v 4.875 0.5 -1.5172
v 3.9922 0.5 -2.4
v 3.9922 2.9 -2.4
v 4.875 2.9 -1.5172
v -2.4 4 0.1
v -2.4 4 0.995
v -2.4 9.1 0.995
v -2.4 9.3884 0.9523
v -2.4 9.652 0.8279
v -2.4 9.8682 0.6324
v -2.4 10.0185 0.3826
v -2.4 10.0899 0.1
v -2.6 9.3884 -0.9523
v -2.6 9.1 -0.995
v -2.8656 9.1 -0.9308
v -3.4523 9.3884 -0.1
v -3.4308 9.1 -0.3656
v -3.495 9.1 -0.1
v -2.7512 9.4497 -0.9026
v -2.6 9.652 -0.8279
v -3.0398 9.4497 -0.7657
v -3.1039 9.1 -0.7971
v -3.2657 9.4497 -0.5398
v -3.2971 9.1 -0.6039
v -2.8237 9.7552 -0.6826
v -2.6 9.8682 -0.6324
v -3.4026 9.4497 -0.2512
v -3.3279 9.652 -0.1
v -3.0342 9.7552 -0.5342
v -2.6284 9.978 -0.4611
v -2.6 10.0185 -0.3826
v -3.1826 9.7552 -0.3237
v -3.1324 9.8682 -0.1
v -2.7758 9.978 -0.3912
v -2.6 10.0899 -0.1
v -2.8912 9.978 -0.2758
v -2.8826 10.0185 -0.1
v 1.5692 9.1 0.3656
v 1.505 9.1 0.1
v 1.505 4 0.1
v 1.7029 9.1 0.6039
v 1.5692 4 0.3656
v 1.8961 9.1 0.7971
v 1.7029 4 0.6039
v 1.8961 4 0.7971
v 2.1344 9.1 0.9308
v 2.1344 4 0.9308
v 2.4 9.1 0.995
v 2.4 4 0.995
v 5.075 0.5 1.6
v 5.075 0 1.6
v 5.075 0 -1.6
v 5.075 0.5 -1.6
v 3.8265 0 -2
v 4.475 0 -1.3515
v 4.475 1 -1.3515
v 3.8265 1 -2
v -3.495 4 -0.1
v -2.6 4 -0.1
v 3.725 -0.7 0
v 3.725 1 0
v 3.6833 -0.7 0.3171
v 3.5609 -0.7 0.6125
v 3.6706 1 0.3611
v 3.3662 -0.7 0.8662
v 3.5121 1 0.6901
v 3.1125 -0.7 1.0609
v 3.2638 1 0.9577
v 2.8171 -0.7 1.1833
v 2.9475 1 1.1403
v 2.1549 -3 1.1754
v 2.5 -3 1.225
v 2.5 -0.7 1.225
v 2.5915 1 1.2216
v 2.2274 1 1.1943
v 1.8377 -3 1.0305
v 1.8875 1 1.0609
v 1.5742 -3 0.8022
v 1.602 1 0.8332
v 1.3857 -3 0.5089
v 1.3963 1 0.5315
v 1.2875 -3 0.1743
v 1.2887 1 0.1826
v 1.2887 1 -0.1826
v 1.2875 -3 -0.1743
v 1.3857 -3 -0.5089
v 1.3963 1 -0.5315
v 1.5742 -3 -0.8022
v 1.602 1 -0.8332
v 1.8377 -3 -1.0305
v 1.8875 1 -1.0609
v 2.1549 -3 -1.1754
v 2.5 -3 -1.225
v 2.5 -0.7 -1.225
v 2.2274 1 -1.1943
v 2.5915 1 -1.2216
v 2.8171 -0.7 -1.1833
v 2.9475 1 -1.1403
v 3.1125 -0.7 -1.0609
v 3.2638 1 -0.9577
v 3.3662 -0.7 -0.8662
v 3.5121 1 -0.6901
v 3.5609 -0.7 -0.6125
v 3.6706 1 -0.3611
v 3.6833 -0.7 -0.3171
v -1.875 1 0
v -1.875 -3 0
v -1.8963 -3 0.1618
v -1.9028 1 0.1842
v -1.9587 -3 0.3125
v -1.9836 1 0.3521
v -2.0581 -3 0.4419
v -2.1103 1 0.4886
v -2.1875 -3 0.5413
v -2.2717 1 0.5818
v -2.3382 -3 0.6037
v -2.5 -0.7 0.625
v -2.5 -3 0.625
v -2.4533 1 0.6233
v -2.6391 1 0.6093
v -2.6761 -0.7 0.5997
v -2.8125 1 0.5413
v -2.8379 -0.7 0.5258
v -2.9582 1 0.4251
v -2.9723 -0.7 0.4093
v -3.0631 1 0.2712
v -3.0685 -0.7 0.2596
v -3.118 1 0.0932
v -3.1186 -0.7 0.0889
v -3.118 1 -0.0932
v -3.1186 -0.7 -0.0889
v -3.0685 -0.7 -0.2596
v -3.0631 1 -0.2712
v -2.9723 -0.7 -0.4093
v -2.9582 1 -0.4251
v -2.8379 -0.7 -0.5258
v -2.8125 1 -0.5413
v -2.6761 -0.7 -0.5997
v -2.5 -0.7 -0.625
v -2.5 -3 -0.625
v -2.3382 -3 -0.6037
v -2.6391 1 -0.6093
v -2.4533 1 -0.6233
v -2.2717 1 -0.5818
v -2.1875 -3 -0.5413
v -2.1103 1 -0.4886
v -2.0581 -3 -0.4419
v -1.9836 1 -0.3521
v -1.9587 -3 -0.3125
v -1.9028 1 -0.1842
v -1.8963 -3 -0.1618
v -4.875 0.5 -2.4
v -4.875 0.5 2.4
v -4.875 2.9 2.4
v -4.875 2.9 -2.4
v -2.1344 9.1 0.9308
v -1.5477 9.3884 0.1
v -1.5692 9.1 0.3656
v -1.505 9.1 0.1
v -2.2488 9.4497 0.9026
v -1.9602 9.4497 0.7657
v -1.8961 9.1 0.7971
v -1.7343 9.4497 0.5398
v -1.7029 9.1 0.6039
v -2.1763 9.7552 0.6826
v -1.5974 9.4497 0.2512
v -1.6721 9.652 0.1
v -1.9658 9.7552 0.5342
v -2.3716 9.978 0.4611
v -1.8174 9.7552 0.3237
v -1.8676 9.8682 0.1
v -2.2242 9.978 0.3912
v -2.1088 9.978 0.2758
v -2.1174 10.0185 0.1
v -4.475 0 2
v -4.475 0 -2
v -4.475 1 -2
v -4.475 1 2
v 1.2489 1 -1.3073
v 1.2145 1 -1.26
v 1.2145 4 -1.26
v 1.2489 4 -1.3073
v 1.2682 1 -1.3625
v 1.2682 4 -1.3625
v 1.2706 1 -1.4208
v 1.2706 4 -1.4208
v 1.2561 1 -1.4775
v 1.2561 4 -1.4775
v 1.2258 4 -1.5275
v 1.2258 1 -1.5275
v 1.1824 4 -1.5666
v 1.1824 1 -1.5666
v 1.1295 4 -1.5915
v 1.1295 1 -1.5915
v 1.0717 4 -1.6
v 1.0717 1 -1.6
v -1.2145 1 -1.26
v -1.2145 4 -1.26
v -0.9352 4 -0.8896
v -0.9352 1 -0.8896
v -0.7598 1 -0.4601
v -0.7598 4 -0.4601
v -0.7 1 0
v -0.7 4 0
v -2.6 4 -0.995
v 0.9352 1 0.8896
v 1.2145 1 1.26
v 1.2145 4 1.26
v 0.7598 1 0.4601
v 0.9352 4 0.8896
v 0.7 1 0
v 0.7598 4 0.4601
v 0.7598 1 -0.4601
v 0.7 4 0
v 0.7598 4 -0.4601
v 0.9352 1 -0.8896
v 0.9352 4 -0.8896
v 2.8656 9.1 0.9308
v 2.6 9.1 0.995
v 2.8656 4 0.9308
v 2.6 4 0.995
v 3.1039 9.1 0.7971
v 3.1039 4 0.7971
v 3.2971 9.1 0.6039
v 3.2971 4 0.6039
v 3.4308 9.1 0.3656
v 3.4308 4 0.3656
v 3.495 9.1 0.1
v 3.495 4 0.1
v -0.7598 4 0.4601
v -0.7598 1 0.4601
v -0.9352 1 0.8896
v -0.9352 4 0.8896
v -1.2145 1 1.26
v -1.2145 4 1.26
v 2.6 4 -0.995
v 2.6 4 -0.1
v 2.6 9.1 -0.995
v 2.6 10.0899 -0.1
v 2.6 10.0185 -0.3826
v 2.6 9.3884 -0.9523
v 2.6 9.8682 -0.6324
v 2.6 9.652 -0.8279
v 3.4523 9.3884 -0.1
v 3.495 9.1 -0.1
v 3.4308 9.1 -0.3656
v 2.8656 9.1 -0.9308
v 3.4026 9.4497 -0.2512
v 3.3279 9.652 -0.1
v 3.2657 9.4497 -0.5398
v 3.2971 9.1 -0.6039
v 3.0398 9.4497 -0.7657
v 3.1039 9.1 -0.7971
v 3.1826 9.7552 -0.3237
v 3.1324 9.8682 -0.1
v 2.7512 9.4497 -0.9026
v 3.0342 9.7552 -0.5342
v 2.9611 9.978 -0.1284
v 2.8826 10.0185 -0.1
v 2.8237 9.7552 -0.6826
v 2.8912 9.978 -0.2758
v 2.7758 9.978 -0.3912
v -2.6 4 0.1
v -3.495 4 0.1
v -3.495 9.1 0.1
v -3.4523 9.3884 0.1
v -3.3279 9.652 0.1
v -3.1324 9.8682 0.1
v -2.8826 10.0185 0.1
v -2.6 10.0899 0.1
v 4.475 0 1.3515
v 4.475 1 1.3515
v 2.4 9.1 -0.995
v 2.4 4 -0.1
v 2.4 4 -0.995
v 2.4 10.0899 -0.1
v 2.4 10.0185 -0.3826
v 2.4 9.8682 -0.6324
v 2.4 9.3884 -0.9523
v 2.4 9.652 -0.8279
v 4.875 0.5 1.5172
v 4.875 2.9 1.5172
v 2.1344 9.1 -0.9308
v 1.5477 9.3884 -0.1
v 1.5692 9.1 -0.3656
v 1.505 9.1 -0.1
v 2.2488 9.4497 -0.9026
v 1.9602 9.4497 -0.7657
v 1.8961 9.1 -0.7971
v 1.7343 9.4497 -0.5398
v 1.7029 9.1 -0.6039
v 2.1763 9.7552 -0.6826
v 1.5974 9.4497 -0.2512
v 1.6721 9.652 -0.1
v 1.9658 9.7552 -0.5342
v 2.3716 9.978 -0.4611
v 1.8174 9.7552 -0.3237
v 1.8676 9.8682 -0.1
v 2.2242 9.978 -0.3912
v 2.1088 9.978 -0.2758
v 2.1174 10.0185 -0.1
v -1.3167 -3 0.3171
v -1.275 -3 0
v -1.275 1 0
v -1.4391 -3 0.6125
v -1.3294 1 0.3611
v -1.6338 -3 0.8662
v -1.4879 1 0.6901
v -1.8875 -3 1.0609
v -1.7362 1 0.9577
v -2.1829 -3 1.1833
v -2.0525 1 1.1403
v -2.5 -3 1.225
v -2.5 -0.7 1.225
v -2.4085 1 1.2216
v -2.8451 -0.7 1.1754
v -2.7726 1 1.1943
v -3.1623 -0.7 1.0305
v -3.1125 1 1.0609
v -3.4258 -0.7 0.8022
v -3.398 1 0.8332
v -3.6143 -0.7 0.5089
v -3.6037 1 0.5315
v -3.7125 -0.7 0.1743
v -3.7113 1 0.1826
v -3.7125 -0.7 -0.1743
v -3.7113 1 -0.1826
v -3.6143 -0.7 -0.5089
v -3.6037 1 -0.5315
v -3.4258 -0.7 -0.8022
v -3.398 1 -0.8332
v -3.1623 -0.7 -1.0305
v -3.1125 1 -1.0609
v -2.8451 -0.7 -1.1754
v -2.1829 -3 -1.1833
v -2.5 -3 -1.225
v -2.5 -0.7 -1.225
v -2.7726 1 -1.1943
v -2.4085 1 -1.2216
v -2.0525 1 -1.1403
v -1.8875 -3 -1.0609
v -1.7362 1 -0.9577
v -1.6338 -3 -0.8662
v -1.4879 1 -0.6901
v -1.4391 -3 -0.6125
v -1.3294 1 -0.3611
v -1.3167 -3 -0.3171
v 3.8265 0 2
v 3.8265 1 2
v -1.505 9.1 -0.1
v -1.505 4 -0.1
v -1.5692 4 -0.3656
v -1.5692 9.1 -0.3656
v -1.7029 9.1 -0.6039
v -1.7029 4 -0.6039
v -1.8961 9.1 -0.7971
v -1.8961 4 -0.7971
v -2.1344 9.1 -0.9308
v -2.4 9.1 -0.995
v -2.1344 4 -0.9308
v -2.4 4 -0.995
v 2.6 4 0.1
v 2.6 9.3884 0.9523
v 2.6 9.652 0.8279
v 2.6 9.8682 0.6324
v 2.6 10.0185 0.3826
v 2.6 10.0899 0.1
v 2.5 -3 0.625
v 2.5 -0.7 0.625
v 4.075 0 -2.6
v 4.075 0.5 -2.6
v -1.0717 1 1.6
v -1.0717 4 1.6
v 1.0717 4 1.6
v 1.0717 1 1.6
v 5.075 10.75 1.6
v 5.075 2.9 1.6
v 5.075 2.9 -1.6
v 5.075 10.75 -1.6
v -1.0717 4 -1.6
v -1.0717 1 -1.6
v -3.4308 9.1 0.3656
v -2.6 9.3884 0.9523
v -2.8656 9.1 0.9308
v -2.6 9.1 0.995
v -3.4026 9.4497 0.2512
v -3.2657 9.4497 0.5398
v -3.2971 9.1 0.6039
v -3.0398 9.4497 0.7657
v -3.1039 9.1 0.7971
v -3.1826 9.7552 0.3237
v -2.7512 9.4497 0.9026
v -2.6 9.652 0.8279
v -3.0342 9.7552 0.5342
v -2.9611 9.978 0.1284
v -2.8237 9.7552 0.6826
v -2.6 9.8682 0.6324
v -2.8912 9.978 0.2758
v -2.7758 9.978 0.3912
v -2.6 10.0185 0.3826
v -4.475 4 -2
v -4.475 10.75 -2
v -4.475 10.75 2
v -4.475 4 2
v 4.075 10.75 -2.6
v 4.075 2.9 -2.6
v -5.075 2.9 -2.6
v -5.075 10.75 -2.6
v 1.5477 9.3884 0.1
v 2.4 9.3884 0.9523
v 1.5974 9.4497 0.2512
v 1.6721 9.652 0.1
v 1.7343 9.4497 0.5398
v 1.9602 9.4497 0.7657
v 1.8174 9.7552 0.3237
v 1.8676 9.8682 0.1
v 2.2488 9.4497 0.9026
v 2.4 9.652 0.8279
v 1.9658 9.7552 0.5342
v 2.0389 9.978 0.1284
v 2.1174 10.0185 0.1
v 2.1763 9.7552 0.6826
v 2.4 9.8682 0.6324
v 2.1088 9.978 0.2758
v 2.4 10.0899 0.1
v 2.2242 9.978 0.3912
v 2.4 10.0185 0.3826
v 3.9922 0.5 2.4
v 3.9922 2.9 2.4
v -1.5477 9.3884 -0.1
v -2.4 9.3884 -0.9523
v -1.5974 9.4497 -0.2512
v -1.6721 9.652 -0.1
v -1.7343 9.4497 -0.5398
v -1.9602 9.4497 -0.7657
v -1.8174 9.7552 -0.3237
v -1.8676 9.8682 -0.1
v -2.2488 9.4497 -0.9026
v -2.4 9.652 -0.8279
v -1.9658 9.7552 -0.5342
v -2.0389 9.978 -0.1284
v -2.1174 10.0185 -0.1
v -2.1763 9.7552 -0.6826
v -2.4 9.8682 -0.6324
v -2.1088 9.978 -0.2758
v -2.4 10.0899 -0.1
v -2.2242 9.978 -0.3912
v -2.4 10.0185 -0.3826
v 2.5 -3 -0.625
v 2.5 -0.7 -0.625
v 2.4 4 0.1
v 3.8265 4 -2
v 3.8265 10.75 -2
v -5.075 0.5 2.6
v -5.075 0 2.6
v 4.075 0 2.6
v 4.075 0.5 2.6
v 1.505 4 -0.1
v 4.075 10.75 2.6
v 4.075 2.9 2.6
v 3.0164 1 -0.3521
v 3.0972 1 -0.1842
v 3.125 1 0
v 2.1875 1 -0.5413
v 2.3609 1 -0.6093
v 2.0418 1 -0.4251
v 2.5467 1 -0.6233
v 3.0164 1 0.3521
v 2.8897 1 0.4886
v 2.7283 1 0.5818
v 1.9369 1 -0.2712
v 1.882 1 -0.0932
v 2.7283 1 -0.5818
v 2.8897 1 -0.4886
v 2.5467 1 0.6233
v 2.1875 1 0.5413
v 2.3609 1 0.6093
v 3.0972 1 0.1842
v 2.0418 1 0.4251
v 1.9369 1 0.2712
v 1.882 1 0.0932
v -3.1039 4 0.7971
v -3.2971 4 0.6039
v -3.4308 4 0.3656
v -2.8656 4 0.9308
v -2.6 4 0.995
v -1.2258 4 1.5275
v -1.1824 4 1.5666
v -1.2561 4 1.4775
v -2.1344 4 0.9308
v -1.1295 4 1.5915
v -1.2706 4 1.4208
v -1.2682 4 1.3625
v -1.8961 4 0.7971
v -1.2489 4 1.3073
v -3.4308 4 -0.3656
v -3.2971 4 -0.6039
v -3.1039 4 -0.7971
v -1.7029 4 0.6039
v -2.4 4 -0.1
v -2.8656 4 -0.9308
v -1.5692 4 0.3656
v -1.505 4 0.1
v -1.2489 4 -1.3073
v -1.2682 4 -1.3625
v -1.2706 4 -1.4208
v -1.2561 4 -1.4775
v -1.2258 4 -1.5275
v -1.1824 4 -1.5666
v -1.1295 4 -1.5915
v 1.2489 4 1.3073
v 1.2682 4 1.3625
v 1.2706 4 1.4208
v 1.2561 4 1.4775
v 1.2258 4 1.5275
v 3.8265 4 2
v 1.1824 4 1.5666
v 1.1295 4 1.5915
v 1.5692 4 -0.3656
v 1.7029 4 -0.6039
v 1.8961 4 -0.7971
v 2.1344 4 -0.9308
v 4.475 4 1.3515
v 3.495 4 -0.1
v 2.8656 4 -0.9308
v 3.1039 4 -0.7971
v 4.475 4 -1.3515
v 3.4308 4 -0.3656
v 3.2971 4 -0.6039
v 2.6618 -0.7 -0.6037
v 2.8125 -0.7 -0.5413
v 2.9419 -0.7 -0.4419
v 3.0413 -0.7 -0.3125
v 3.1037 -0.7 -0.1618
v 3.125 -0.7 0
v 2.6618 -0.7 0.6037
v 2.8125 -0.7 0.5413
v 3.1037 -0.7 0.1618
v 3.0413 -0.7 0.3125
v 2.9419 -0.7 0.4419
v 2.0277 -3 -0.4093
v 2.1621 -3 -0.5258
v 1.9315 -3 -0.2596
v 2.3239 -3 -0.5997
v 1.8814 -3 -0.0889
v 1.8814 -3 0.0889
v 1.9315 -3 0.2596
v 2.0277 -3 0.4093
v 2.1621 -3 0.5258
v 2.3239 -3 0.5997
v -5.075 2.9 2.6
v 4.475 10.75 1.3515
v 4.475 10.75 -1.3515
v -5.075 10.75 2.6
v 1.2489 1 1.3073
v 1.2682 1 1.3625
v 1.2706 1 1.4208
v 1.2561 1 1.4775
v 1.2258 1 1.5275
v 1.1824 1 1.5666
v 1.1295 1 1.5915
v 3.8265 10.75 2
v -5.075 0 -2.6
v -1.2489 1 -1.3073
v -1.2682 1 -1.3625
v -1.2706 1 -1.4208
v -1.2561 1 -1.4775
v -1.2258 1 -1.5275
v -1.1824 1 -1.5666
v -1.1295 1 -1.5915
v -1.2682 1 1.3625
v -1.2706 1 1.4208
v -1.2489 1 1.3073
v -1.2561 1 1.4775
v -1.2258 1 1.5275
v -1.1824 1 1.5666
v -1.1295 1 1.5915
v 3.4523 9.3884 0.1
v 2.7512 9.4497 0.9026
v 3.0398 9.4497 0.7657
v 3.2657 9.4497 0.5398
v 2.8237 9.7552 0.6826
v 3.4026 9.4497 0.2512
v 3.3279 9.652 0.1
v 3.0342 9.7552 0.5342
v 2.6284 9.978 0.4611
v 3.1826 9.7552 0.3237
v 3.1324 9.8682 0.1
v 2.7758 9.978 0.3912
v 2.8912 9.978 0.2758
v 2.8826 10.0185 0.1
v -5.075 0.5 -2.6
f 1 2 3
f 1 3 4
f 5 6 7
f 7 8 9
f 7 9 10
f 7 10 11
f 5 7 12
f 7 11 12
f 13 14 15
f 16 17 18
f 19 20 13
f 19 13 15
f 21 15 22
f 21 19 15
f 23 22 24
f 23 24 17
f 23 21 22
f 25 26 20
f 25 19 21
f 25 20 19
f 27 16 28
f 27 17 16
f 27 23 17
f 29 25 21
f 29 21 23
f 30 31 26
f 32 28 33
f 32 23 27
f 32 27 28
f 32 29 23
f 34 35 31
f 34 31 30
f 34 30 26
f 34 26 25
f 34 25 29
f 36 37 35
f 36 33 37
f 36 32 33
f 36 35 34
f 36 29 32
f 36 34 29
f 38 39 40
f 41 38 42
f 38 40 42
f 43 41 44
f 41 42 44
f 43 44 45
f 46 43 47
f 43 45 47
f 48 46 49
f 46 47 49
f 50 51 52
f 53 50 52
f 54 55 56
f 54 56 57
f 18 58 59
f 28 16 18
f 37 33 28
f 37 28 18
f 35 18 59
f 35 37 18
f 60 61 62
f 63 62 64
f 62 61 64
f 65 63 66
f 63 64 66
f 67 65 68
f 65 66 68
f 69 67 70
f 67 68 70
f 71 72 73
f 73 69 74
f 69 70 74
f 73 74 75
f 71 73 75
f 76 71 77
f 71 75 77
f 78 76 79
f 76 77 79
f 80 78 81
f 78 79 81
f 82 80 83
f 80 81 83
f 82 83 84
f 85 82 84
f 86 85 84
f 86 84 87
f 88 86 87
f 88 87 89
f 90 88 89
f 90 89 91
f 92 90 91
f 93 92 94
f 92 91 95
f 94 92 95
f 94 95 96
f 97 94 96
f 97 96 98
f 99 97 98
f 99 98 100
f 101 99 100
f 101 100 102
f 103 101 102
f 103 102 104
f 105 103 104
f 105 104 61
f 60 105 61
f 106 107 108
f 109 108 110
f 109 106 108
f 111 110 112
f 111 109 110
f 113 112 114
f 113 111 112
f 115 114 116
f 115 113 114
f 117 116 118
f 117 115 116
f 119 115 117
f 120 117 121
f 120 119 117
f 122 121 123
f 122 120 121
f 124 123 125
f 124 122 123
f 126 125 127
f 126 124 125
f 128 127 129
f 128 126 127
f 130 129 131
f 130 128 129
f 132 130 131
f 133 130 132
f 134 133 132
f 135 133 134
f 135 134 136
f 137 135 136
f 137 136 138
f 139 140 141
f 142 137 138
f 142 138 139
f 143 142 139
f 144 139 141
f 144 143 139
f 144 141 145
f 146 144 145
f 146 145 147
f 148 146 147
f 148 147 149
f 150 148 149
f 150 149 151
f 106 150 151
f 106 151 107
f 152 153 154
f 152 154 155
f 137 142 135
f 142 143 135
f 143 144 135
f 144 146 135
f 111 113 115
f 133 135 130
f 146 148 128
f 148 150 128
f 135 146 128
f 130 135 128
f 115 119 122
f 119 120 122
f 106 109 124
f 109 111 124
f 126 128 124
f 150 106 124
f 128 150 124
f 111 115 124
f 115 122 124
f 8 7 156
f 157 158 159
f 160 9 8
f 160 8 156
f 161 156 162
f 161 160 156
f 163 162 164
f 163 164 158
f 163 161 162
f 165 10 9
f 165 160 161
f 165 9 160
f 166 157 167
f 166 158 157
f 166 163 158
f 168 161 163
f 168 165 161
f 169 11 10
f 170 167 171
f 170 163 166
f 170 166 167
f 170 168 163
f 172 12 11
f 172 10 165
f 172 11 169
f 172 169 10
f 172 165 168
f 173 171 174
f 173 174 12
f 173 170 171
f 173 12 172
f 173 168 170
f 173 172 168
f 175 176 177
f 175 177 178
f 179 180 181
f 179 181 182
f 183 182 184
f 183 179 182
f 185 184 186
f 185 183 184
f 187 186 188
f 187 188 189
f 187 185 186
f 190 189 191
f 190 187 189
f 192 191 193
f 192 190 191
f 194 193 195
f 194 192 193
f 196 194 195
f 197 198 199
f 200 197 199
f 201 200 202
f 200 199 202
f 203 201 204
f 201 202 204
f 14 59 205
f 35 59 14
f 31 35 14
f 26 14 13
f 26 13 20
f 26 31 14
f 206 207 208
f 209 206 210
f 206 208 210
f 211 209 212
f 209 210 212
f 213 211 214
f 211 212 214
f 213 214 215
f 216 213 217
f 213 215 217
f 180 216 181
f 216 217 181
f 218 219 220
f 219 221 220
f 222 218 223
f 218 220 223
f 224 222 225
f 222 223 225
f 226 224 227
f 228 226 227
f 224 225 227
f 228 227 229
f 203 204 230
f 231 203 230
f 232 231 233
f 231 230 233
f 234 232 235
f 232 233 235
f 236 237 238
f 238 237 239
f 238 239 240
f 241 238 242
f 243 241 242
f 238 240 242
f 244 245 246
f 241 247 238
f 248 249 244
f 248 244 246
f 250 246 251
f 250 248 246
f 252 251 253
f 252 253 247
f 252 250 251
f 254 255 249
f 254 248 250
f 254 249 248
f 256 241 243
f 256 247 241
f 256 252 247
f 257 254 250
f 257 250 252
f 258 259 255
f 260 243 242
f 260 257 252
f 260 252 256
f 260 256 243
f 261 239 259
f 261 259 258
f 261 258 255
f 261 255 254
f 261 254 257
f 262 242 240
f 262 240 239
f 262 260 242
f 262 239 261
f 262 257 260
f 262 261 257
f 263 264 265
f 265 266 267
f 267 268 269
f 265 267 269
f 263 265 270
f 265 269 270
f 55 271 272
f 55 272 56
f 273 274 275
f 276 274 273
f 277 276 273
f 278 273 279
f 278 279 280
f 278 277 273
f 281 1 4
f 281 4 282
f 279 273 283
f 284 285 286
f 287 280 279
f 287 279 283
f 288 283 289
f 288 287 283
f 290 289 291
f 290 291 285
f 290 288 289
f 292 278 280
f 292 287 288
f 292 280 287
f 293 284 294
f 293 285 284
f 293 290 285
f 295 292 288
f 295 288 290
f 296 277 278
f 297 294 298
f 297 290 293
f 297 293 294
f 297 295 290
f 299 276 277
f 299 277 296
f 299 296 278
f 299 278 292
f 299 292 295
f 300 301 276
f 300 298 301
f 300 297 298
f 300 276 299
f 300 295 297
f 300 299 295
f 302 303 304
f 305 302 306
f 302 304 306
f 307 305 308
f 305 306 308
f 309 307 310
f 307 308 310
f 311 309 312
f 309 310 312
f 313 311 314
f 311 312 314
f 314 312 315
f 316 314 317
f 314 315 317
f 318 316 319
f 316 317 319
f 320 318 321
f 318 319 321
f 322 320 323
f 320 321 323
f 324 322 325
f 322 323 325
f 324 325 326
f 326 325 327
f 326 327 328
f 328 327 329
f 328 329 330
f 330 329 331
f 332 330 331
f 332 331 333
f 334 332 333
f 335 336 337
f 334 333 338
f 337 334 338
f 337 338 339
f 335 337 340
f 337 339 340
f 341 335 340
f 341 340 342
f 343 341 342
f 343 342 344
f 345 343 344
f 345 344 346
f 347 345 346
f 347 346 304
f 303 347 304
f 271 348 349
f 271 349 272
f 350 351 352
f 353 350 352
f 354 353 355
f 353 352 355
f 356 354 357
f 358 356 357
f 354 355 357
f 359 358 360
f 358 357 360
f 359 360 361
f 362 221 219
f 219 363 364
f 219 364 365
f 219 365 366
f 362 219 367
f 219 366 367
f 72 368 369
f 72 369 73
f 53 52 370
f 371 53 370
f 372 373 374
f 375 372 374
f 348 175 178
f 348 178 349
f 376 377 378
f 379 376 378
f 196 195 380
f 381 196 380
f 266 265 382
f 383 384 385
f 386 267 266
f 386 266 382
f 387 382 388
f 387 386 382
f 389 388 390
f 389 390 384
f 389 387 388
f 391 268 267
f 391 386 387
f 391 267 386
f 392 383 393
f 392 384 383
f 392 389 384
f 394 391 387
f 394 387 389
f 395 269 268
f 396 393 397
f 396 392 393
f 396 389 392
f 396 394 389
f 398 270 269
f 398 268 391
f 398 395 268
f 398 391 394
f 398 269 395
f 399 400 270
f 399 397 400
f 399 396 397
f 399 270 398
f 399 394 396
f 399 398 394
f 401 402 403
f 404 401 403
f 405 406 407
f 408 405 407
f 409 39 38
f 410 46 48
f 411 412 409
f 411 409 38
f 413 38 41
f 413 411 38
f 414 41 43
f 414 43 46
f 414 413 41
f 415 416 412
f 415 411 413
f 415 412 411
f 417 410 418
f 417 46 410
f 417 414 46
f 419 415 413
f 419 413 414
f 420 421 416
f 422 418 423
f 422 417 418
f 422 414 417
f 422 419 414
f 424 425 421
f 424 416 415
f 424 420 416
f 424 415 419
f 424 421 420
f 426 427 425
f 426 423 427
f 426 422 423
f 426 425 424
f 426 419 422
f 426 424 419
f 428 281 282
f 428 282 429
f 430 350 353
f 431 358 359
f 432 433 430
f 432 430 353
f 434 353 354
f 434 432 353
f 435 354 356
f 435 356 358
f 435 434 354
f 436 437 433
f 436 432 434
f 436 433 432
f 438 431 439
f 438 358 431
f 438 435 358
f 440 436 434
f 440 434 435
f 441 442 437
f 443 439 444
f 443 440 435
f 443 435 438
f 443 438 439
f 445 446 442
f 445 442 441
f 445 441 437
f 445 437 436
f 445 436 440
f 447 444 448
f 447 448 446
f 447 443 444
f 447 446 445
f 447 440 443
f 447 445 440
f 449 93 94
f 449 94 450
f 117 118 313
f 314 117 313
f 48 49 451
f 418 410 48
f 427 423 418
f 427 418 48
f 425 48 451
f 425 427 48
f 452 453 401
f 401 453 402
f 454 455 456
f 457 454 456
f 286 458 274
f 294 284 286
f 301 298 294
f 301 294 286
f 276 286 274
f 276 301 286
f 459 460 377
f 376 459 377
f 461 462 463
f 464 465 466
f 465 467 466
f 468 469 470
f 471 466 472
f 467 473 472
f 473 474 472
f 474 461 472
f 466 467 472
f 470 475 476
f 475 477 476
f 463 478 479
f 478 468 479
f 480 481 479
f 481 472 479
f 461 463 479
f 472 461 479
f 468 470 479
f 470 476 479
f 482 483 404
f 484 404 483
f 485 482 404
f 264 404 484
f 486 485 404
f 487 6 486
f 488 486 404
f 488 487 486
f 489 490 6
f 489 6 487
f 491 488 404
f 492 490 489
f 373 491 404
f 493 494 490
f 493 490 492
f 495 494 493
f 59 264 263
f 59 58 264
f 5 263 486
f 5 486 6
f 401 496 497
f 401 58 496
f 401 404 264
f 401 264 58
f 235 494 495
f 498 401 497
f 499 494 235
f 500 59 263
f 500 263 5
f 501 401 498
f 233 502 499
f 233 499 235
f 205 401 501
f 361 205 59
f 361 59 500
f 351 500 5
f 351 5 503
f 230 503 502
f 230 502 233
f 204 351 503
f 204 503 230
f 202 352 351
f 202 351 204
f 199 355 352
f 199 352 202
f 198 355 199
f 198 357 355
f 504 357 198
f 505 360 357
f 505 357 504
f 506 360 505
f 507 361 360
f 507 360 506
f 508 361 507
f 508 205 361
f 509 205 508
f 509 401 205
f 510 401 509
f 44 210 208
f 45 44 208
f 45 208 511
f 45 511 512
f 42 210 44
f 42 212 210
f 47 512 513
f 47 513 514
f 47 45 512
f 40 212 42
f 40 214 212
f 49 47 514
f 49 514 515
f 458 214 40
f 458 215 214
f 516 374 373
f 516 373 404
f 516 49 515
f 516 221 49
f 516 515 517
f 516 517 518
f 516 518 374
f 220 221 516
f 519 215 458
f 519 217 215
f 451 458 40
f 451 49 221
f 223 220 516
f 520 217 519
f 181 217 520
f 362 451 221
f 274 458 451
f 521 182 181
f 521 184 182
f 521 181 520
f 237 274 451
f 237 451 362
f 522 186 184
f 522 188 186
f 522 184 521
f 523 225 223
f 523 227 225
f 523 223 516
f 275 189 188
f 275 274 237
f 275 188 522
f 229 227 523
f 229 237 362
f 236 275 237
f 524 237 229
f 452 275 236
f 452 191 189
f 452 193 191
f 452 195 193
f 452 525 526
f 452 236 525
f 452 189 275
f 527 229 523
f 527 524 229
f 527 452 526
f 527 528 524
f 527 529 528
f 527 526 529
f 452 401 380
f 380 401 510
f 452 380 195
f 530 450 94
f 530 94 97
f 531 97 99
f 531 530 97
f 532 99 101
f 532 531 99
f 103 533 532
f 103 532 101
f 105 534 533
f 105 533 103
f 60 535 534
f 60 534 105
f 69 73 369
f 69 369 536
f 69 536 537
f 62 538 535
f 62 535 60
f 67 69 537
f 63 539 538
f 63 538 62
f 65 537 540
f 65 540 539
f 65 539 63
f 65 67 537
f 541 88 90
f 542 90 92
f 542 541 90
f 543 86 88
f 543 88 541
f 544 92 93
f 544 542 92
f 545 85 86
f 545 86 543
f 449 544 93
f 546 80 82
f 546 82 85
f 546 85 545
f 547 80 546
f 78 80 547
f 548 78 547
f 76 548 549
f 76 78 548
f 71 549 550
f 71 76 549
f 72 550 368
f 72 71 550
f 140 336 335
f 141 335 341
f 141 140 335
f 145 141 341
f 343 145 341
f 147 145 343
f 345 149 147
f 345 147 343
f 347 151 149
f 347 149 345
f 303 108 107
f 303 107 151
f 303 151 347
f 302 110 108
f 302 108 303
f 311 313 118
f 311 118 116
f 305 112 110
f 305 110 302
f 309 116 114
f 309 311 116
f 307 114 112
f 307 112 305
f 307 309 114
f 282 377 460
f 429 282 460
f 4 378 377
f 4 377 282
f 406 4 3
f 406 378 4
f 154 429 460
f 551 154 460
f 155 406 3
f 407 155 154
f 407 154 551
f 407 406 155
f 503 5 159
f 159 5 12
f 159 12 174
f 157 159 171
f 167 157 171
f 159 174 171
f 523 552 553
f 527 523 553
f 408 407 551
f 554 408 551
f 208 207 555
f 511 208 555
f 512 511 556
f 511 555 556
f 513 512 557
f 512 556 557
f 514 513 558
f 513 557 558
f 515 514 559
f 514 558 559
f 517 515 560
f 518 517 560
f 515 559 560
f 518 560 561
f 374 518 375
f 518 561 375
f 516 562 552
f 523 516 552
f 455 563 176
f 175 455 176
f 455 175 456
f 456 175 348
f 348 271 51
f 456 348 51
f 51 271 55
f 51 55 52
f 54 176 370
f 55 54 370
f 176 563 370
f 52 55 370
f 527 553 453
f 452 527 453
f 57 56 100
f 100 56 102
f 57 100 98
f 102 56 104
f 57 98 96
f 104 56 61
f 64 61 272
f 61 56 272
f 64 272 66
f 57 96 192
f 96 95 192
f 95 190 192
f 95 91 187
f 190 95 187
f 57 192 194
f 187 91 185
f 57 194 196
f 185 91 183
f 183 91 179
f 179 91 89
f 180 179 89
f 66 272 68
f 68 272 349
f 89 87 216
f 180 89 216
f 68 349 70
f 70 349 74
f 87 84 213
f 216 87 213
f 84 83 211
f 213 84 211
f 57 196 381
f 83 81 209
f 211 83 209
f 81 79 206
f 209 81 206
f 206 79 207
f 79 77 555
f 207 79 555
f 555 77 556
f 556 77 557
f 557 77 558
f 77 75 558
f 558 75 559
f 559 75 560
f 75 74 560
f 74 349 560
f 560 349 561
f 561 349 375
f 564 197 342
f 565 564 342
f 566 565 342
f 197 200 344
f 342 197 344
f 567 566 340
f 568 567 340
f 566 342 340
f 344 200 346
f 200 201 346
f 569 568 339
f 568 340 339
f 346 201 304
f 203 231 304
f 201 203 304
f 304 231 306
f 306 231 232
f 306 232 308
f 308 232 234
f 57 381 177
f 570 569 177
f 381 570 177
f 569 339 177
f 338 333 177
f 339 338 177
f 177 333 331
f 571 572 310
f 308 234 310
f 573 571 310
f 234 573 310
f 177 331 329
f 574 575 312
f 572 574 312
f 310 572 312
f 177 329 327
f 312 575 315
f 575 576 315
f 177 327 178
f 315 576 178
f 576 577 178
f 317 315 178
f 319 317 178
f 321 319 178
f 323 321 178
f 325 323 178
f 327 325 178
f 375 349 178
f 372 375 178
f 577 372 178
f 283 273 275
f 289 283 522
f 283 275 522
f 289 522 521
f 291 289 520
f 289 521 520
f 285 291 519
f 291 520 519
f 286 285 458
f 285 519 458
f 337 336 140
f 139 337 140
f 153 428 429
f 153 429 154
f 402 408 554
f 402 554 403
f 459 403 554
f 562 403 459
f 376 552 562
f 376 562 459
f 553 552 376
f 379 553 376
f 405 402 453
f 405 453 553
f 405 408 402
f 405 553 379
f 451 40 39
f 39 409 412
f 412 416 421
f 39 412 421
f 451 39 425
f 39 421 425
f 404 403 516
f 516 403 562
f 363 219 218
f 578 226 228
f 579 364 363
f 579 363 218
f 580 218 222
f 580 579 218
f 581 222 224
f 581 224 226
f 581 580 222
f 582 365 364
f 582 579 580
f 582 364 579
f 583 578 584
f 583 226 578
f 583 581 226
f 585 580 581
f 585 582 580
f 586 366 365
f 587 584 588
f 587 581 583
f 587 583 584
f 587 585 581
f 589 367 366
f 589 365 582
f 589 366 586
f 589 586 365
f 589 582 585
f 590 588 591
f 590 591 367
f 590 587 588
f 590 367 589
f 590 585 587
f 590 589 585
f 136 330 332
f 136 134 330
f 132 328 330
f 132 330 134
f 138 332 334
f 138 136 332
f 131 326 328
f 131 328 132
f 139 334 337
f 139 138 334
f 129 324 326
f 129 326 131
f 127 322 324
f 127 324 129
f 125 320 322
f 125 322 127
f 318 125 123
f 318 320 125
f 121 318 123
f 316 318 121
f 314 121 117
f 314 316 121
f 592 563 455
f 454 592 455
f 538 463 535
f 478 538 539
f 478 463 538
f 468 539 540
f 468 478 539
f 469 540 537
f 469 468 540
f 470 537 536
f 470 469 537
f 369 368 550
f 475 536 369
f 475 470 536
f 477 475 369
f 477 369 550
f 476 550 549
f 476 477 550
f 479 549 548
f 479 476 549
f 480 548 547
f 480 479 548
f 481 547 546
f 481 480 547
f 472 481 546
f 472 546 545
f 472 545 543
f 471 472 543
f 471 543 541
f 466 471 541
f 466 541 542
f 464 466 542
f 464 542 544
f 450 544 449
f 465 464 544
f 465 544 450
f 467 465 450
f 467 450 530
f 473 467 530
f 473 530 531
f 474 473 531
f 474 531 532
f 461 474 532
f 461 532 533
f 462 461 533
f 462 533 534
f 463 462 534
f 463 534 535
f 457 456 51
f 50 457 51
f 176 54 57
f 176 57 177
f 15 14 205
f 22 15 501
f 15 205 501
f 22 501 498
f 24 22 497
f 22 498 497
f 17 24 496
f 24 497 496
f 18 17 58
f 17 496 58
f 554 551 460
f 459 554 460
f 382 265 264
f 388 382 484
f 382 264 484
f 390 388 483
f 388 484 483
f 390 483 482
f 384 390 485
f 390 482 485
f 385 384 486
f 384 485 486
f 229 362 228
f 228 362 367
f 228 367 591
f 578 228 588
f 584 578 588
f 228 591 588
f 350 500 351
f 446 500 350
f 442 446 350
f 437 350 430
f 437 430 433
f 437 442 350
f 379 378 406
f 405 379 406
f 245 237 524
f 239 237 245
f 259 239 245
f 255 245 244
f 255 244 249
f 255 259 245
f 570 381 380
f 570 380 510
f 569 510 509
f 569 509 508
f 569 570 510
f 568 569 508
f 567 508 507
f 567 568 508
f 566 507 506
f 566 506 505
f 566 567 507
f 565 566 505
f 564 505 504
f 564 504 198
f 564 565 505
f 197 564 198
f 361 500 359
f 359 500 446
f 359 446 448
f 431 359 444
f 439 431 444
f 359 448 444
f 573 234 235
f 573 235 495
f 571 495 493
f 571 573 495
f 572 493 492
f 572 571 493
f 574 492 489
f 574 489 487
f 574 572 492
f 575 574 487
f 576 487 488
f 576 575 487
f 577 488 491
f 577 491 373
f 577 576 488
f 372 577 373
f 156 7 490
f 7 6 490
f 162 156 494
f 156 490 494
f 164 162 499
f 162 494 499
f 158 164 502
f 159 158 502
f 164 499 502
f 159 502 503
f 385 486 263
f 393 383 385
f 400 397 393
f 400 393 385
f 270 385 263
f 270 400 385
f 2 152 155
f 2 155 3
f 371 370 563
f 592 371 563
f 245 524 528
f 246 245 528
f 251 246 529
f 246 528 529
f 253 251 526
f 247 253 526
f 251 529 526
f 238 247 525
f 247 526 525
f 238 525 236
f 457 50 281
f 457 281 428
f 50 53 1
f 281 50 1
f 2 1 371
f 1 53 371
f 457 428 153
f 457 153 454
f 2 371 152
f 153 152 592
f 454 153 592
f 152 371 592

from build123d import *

# Parameters (mm, degrees)
SHAPE_DEPTH         = 10.75
CUT_EXTRUDE1_DEPTH  = 6.75
CUT_EXTRUDE2_REACH  = 6
FILLET1_R           = 0.2
SKETCH4_R           = 1
BOSS_EXTRUDE2_DEPTH = 6.1
FILLET2_R           = 1
SKETCH5_W           = 0.2
SKETCH5_H           = 2
SKETCH5_W_2         = 2
SKETCH5_H_2         = 0.2
CUT_EXTRUDE3_DEPTH  = 6.75
CUT_EXTRUDE4_DEPTH  = 2.4
CUT_EXTRUDE5_DEPTH  = 1
SKETCH7_R           = 1.225
SKETCH7_R_2         = 0.625
BOSS_EXTRUDE3_DEPTH = 4
SKETCH9_W           = 1.225
SKETCH9_H           = 2.45
CUT_EXTRUDE6_DEPTH  = 2.3


with BuildPart() as part:
    # Sketch1 → Shape (new body)
    with BuildSketch(Plane(origin=(0, 0, 0), x_dir=(1, 0, 0), z_dir=(0, 1, 0))):
        Polygon((5.075, -1.6), (5.075, 1.6), (4.075, 2.6), (-5.075, 2.6), (-5.075, -2.6), (4.075, -2.6), align=None)
    extrude(amount=SHAPE_DEPTH)

    # Sketch2 → Cut-Extrude1 (cut)
    with BuildSketch(Plane(origin=(0, 10.75, 0), x_dir=(1, 0, 0), z_dir=(0, 1, 0))):
        Polygon((3.826471863, -2), (4.475, -1.351471863), (4.475, 1.351471863), (3.826471863, 2), (-4.475, 2), (-4.475, -2), align=None)
    extrude(amount=-CUT_EXTRUDE1_DEPTH, mode=Mode.SUBTRACT)

    # Sketch3 → Cut-Extrude2 (cut, up to next)
    with BuildSketch(Plane(origin=(0, 4, 0), x_dir=(1, 0, 0), z_dir=(0, 1, 0)), mode=Mode.PRIVATE) as cut_extrude2_sk1:
        with BuildLine():
            Line((-1.675378875, -1.6), (1.675378875, -1.6))
            ThreePointArc((1.675378875, -1.6), (0.7, 0), (1.675378875, 1.6))
            Line((1.675378875, 1.6), (-1.675378875, 1.6))
            ThreePointArc((-1.675378875, 1.6), (-0.963068312, 0.936931688), (-0.7, 0))
            ThreePointArc((-0.7, 0), (-0.963068312, -0.936931688), (-1.675378875, -1.6))
        make_face()
    cut_extrude2_tool1 = extrude(cut_extrude2_sk1.sketch, amount=-CUT_EXTRUDE2_REACH, mode=Mode.PRIVATE) & part.part
    add(cut_extrude2_tool1.solids().sort_by_distance((0, 4, 0))[0], mode=Mode.SUBTRACT)

    # Fillet1
    fillet1_edges = [part.edges().sort_by_distance(p)[0] for p in [
        (1.675378875, 2, 1.6),
        (-1.675378875, 2, 1.6),
        (-1.675378875, 2, -1.6),
        (1.675378875, 2, -1.6),
    ]]
    fillet(fillet1_edges, radius=FILLET1_R)

    # Sketch4 → Boss-Extrude2 (add)
    with BuildSketch(Plane(origin=(0, 4, 0), x_dir=(1, 0, 0), z_dir=(0, 1, 0))):
        with Locations((-2.5, 0)):
            Circle(SKETCH4_R)
        with Locations((2.5, 0)):
            Circle(SKETCH4_R)
    extrude(amount=BOSS_EXTRUDE2_DEPTH)

    # Fillet2
    fillet2_edges = [part.edges().sort_by_distance(p)[0] for p in [
        (-3.5, 10.1, 0),
        (1.5, 10.1, 0),
    ]]
    fillet(fillet2_edges, radius=FILLET2_R)

    # Sketch5 → Cut-Extrude3 (cut)
    with BuildSketch(Plane(origin=(0, 10.75, 0), x_dir=(1, 0, 0), z_dir=(0, 1, 0))):
        with Locations((-2.5, 0)):
            Rectangle(SKETCH5_W, SKETCH5_H)
        with Locations((-2.5, 0)):
            Rectangle(SKETCH5_W_2, SKETCH5_H_2)
        with Locations((2.5, 0)):
            Rectangle(SKETCH5_W_2, SKETCH5_H_2)
        with Locations((2.5, 0)):
            Rectangle(SKETCH5_W, SKETCH5_H)
    extrude(amount=-CUT_EXTRUDE3_DEPTH, mode=Mode.SUBTRACT)

    # Sketch6 → Cut-Extrude4 (cut)
    with BuildSketch(Plane(origin=(0, 0.5, 0), x_dir=(-1, 0, 0), z_dir=(0, -1, 0))):
        Polygon((-5.075, -1.6), (-4.075, -2.6), (5.075, -2.6), (5.075, 2.6), (-4.075, 2.6), (-5.075, 1.6), align=None)
        Polygon((-4.875, -1.517157288), (-3.992157288, -2.4), (4.875, -2.4), (4.875, 2.4), (-3.992157288, 2.4), (-4.875, 1.517157288), align=None, mode=Mode.SUBTRACT)
    extrude(amount=-CUT_EXTRUDE4_DEPTH, mode=Mode.SUBTRACT)

    # Sketch8 → Cut-Extrude5 (cut)
    with BuildSketch(Plane.XZ):
        Polygon((-4.475, -2), (-4.475, 2), (3.826471863, 2), (4.475, 1.351471863), (4.475, -1.351471863), (3.826471863, -2), align=None)
    extrude(amount=-CUT_EXTRUDE5_DEPTH, mode=Mode.SUBTRACT)

    # Sketch7 → Boss-Extrude3 (add)
    with BuildSketch(Plane.XZ.offset(-1)):
        with Locations((-2.5, 0)):
            Circle(SKETCH7_R)
        with Locations((-2.5, 0)):
            Circle(SKETCH7_R_2, mode=Mode.SUBTRACT)
        with Locations((2.5, 0)):
            Circle(SKETCH7_R)
        with Locations((2.5, 0)):
            Circle(SKETCH7_R_2, mode=Mode.SUBTRACT)
    extrude(amount=BOSS_EXTRUDE3_DEPTH)

    # Sketch9 → Cut-Extrude6 (cut)
    with BuildSketch(Plane.XZ.offset(3)):
        with Locations((-3.1125, 0)):
            Rectangle(SKETCH9_W, SKETCH9_H)
        with Locations((3.1125, 0)):
            Rectangle(SKETCH9_W, SKETCH9_H)
    extrude(amount=-CUT_EXTRUDE6_DEPTH, mode=Mode.SUBTRACT)


solid = part.part
